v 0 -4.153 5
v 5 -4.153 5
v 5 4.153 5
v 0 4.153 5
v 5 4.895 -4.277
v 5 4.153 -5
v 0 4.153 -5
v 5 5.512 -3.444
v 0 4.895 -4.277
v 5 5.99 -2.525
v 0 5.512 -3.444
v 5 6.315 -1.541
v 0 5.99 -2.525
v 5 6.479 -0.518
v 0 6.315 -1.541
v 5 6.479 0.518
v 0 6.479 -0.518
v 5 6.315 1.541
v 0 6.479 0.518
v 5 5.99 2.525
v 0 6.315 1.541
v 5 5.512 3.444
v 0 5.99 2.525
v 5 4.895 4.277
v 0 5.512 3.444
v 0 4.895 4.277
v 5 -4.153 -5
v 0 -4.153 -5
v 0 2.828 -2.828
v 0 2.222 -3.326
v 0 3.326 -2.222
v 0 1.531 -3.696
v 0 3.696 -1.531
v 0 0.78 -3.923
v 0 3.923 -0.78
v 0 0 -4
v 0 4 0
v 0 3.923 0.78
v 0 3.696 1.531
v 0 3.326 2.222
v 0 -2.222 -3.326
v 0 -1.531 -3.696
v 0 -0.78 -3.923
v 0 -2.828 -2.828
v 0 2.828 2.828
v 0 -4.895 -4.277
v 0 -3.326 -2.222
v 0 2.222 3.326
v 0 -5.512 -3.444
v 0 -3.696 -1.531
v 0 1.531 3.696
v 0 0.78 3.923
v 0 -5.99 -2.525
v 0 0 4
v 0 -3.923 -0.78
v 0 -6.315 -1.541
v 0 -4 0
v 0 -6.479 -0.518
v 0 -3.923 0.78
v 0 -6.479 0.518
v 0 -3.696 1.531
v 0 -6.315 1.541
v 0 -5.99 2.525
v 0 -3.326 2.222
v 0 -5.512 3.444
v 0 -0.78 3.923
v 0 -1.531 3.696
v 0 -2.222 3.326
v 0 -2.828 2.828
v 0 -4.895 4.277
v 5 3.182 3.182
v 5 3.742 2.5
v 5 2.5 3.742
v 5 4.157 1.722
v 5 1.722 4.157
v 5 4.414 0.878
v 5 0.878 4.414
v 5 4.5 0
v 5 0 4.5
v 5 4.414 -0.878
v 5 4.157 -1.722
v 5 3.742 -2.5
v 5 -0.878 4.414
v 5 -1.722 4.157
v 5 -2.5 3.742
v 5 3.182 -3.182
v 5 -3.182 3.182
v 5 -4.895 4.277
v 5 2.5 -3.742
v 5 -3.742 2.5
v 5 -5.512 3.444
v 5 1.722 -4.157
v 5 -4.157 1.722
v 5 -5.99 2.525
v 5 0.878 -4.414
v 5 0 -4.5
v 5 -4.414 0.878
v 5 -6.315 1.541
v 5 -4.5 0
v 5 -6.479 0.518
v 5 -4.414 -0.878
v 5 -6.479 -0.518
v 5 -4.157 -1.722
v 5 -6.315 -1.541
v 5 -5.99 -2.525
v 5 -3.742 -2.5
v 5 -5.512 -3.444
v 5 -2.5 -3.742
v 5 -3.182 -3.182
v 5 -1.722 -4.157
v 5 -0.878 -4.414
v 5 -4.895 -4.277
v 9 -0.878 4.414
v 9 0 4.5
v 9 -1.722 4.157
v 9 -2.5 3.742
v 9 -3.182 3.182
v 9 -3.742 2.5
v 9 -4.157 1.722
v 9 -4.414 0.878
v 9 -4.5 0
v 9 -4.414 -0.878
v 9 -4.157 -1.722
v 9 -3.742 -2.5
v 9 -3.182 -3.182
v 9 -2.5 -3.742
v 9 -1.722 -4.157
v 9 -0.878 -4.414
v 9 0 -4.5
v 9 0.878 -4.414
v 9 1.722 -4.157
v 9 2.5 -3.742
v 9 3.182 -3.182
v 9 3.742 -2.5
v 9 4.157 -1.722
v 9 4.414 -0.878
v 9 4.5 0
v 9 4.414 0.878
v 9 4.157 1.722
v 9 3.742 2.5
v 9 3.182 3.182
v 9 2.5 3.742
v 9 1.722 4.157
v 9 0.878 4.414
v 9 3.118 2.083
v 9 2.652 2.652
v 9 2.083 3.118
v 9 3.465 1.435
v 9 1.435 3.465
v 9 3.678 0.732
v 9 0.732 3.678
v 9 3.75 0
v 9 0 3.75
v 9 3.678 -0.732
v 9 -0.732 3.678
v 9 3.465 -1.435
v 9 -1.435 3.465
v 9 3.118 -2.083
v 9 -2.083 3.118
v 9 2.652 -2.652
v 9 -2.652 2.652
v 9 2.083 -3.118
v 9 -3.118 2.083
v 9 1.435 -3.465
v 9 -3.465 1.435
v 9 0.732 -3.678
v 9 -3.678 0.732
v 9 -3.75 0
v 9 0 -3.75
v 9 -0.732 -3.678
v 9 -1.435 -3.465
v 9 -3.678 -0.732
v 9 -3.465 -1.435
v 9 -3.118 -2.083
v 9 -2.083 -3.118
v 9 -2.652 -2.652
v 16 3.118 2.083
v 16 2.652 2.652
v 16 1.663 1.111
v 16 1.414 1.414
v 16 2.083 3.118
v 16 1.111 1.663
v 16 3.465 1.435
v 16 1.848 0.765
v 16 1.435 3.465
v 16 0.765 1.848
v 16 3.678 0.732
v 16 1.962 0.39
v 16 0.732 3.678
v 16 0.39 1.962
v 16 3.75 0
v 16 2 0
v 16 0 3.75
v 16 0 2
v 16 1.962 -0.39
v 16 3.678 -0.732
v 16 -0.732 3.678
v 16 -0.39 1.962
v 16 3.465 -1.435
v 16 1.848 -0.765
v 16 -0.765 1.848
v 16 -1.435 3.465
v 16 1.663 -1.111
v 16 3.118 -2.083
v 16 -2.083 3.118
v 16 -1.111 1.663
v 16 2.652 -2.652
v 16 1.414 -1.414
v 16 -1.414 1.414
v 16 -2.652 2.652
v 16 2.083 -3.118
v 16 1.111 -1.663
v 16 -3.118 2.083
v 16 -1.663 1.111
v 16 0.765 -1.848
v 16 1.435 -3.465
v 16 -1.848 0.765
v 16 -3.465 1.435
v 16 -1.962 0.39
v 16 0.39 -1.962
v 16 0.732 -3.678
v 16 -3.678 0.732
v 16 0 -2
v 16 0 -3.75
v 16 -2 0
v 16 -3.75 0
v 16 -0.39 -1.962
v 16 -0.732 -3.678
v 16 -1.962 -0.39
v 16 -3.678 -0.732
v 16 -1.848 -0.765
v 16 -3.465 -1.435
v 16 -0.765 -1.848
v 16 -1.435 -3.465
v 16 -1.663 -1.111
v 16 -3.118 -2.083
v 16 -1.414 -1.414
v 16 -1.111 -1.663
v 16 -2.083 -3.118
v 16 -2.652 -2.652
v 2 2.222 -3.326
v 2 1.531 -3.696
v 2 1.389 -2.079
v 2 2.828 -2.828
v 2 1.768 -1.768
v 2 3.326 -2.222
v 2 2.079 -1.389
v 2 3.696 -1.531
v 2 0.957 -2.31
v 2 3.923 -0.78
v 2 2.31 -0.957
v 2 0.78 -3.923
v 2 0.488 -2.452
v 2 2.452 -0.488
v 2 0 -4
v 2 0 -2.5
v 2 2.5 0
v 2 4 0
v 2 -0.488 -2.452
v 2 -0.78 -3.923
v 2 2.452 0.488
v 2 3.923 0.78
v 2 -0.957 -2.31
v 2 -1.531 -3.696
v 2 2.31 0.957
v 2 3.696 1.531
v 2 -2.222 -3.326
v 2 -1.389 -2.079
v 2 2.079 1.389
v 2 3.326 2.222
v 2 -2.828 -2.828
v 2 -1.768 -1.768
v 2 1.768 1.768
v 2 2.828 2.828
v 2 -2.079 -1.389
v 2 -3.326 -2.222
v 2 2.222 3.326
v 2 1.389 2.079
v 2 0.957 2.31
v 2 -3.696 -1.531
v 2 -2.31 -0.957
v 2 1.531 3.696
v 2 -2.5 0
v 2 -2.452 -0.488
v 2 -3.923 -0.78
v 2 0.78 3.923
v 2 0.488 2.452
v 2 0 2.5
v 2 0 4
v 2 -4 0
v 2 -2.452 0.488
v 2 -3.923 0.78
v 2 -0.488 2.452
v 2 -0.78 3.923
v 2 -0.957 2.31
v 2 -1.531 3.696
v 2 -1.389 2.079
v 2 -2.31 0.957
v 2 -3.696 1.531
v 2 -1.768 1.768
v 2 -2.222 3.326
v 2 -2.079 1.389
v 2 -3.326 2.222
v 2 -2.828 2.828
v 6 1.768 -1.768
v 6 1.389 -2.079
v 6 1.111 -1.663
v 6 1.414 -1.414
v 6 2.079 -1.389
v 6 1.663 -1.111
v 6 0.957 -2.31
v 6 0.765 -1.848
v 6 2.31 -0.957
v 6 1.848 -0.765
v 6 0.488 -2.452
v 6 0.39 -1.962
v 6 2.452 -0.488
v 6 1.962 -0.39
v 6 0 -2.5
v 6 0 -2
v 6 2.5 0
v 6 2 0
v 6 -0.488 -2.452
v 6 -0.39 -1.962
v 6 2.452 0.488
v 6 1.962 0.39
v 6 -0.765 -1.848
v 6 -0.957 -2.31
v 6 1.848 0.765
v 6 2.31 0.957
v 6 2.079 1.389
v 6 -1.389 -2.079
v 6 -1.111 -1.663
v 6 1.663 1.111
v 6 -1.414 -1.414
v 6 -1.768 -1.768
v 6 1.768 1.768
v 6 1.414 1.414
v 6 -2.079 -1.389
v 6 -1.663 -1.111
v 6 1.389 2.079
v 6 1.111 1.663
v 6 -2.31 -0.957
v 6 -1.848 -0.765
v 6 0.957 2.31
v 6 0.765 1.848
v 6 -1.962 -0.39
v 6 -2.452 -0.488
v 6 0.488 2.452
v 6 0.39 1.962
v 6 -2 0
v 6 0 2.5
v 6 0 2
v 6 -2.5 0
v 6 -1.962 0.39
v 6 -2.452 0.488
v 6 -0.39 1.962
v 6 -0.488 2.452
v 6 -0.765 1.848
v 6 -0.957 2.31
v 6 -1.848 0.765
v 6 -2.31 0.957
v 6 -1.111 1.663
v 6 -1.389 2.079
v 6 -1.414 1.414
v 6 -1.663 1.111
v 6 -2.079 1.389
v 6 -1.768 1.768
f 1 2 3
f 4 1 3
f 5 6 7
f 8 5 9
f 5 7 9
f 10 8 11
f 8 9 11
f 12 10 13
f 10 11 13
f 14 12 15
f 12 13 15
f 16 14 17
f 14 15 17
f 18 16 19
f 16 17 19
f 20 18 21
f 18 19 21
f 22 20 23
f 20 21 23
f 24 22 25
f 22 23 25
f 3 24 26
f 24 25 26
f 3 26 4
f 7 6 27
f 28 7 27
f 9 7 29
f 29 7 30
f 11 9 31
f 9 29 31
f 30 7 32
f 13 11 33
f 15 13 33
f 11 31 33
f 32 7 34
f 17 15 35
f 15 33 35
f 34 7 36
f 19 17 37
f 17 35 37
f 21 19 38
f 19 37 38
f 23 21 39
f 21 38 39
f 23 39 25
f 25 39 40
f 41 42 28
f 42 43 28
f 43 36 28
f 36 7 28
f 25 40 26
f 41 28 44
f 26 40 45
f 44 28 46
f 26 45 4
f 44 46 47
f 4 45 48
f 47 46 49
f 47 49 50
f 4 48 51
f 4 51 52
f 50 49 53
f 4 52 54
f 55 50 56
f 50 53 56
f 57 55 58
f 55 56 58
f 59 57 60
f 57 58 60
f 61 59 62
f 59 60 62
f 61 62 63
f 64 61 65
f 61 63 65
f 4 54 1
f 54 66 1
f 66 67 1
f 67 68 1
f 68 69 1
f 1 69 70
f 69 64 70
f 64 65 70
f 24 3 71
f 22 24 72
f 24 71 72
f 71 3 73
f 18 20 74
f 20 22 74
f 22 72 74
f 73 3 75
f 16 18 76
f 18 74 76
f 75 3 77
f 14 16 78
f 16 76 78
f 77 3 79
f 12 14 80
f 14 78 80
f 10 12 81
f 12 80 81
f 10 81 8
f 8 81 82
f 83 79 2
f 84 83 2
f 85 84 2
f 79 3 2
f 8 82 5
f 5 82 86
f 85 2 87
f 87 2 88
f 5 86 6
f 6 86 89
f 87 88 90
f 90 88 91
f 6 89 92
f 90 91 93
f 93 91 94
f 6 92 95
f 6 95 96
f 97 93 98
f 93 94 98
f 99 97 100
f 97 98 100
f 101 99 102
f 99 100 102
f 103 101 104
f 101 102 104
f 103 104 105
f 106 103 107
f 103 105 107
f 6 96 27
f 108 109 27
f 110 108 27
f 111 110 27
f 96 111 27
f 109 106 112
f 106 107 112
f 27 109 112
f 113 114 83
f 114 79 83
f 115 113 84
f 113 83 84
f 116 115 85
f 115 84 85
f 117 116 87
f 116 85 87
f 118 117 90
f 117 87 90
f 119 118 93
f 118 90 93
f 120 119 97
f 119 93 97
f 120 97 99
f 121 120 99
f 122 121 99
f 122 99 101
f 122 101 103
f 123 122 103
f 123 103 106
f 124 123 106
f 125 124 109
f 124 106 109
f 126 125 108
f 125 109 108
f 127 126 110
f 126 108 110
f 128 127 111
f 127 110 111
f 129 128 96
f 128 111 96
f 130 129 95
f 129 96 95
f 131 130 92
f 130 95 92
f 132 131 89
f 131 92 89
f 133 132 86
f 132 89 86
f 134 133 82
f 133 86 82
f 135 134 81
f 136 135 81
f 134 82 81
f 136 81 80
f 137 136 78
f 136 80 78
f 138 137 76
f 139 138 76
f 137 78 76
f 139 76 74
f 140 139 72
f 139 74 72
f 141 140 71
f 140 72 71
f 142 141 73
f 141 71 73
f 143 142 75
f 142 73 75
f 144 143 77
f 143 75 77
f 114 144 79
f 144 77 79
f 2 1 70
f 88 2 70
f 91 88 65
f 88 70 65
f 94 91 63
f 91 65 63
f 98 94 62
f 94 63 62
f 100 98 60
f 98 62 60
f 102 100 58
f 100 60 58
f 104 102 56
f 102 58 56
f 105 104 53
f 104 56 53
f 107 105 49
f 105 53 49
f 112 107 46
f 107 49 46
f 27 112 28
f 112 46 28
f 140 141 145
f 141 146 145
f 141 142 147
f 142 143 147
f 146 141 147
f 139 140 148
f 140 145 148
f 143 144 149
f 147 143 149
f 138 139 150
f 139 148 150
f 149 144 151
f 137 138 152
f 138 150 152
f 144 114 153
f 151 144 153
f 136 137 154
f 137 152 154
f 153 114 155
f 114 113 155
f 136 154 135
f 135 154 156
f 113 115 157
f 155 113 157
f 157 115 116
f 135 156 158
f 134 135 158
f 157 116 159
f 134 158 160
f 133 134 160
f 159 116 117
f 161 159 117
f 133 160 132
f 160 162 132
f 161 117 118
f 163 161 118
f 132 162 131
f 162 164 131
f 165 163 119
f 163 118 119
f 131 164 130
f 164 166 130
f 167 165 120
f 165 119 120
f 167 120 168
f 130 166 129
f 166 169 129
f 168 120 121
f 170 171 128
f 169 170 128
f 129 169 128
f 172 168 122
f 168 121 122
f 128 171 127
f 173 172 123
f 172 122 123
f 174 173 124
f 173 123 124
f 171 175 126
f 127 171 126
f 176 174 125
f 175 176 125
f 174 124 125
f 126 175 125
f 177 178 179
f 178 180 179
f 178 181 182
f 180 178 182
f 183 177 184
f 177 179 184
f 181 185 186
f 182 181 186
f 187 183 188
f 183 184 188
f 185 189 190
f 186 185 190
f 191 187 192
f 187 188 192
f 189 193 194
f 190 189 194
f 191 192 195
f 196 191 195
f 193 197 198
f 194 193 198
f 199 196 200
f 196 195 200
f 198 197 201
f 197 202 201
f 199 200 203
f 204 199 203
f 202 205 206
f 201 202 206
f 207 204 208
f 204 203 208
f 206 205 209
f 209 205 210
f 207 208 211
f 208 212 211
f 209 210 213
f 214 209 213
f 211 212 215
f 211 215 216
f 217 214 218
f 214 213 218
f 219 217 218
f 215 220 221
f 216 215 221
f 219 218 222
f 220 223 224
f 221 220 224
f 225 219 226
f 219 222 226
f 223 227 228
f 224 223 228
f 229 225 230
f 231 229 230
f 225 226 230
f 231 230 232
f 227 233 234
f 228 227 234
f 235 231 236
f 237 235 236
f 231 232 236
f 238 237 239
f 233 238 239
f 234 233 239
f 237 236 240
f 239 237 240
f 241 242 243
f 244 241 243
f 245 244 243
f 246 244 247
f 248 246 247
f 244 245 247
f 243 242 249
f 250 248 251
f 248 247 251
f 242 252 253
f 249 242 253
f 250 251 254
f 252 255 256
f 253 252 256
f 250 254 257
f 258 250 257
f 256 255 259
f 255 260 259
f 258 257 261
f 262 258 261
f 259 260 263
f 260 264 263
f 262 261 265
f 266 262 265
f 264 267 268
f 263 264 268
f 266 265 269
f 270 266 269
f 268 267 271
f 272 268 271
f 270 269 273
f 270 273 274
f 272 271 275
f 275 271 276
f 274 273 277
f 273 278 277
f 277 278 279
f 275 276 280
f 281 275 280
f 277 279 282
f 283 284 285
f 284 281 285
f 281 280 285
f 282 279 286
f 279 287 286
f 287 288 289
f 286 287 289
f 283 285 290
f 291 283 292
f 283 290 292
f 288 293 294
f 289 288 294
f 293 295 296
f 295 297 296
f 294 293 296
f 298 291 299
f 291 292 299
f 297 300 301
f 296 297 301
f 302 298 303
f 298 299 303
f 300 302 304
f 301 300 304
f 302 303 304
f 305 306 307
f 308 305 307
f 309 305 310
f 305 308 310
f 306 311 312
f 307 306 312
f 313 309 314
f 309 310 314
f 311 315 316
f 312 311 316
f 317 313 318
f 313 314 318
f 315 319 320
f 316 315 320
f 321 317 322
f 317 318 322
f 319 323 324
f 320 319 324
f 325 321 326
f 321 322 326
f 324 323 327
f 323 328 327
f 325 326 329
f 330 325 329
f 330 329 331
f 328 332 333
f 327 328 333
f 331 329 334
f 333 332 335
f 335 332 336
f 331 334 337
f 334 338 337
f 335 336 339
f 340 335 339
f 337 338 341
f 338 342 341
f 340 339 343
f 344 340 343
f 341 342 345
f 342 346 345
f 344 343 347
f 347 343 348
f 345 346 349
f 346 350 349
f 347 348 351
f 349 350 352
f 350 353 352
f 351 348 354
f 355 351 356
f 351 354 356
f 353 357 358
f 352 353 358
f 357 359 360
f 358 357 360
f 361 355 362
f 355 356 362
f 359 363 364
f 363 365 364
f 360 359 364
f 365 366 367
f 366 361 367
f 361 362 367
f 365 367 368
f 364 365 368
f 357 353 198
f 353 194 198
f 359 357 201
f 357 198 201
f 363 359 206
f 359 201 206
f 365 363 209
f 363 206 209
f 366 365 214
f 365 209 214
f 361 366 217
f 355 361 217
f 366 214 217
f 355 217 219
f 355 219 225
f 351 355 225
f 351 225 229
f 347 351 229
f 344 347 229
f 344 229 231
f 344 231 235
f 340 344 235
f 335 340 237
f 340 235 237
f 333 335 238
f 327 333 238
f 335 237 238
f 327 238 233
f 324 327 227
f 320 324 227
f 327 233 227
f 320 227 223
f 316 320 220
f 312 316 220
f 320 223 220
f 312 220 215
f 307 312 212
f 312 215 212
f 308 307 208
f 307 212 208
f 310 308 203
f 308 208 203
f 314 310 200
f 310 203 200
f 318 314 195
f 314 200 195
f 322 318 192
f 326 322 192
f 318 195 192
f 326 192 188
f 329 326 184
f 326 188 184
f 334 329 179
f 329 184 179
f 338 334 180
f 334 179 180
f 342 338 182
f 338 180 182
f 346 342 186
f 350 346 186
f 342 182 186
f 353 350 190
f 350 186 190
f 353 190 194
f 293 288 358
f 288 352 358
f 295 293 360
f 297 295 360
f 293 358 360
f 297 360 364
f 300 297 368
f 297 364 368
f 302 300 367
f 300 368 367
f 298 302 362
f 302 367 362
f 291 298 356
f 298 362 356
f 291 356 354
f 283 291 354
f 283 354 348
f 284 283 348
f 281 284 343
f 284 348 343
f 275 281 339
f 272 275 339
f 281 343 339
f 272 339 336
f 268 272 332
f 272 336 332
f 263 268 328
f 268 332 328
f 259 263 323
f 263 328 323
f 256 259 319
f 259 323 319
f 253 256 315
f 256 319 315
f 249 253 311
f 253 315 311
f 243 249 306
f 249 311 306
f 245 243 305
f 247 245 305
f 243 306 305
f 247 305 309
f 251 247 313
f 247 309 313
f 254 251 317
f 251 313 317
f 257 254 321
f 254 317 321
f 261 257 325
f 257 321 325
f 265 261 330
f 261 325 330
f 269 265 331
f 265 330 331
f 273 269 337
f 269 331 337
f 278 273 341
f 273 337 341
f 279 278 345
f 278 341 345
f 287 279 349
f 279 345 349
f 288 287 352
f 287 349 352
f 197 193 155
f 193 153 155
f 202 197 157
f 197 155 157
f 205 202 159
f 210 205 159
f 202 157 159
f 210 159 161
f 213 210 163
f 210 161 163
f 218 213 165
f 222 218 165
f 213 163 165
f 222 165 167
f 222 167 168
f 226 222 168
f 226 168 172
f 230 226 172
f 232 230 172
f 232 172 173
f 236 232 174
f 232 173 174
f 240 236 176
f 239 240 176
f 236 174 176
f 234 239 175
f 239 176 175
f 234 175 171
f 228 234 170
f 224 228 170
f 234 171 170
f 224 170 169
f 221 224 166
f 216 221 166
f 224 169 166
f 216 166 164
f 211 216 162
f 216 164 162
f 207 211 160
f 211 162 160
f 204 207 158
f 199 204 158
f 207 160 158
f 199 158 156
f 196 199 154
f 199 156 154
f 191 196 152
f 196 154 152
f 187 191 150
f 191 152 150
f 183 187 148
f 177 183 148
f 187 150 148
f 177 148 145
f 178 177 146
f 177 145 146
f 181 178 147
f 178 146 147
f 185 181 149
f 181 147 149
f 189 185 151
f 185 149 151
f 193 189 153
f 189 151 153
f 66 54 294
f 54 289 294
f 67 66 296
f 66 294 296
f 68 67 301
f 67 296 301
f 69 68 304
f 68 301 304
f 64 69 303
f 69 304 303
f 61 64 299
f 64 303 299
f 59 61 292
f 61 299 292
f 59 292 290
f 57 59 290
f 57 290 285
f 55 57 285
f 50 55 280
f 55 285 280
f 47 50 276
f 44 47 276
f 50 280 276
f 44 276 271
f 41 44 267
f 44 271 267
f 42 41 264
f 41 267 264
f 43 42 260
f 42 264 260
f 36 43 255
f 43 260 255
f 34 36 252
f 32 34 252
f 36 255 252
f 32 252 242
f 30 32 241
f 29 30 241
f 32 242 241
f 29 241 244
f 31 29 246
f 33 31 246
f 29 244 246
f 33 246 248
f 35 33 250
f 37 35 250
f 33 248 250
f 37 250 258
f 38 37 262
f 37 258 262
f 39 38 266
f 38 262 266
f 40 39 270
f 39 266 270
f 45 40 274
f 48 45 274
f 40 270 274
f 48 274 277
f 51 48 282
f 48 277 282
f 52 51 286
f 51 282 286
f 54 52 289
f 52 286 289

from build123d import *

# Parameters (mm, degrees)
CUT_EXTRUDE_1_DEPTH = 15.335271187


with BuildPart() as part:
    # Эскиз1 → Повернуть1 (revolve)
    with BuildSketch(Plane.XY, mode=Mode.PRIVATE) as revolve_1_sk:
        Polygon((0, 4), (2, 4), (2, 2.5), (6, 2.5), (6, 2), (16, 2), (16, 3.75), (9, 3.75), (9, 4.5), (5, 4.5), (5, 6.5), (0, 6.5), align=None)
    revolve(revolve_1_sk.sketch.rotate(Axis((0, 0, 0), (1, 0, 0)), 90), axis=Axis((0, 0, 0), (1, 0, 0)))

    # Эскиз2 → Вырез-Вытянуть1 (cut, through all)
    with BuildSketch(Plane(origin=(5, 0, 0), x_dir=(0, 0, -1), z_dir=(1, 0, 0))):
        with BuildLine():
            ThreePointArc((-5, 4.153311931), (-6.5, 0), (-5, -4.153311931))
            Line((-5, -4.153311931), (-5, 4.153311931))
        make_face()
        with BuildLine():
            Line((5, 4.153311931), (5, -4.153311931))
            ThreePointArc((5, -4.153311931), (6.11350963, -2.207940217), (6.5, 0))
            ThreePointArc((6.5, 0), (6.11350963, 2.207940217), (5, 4.153311931))
        make_face()
    extrude(amount=-CUT_EXTRUDE_1_DEPTH, mode=Mode.SUBTRACT)


solid = part.part
